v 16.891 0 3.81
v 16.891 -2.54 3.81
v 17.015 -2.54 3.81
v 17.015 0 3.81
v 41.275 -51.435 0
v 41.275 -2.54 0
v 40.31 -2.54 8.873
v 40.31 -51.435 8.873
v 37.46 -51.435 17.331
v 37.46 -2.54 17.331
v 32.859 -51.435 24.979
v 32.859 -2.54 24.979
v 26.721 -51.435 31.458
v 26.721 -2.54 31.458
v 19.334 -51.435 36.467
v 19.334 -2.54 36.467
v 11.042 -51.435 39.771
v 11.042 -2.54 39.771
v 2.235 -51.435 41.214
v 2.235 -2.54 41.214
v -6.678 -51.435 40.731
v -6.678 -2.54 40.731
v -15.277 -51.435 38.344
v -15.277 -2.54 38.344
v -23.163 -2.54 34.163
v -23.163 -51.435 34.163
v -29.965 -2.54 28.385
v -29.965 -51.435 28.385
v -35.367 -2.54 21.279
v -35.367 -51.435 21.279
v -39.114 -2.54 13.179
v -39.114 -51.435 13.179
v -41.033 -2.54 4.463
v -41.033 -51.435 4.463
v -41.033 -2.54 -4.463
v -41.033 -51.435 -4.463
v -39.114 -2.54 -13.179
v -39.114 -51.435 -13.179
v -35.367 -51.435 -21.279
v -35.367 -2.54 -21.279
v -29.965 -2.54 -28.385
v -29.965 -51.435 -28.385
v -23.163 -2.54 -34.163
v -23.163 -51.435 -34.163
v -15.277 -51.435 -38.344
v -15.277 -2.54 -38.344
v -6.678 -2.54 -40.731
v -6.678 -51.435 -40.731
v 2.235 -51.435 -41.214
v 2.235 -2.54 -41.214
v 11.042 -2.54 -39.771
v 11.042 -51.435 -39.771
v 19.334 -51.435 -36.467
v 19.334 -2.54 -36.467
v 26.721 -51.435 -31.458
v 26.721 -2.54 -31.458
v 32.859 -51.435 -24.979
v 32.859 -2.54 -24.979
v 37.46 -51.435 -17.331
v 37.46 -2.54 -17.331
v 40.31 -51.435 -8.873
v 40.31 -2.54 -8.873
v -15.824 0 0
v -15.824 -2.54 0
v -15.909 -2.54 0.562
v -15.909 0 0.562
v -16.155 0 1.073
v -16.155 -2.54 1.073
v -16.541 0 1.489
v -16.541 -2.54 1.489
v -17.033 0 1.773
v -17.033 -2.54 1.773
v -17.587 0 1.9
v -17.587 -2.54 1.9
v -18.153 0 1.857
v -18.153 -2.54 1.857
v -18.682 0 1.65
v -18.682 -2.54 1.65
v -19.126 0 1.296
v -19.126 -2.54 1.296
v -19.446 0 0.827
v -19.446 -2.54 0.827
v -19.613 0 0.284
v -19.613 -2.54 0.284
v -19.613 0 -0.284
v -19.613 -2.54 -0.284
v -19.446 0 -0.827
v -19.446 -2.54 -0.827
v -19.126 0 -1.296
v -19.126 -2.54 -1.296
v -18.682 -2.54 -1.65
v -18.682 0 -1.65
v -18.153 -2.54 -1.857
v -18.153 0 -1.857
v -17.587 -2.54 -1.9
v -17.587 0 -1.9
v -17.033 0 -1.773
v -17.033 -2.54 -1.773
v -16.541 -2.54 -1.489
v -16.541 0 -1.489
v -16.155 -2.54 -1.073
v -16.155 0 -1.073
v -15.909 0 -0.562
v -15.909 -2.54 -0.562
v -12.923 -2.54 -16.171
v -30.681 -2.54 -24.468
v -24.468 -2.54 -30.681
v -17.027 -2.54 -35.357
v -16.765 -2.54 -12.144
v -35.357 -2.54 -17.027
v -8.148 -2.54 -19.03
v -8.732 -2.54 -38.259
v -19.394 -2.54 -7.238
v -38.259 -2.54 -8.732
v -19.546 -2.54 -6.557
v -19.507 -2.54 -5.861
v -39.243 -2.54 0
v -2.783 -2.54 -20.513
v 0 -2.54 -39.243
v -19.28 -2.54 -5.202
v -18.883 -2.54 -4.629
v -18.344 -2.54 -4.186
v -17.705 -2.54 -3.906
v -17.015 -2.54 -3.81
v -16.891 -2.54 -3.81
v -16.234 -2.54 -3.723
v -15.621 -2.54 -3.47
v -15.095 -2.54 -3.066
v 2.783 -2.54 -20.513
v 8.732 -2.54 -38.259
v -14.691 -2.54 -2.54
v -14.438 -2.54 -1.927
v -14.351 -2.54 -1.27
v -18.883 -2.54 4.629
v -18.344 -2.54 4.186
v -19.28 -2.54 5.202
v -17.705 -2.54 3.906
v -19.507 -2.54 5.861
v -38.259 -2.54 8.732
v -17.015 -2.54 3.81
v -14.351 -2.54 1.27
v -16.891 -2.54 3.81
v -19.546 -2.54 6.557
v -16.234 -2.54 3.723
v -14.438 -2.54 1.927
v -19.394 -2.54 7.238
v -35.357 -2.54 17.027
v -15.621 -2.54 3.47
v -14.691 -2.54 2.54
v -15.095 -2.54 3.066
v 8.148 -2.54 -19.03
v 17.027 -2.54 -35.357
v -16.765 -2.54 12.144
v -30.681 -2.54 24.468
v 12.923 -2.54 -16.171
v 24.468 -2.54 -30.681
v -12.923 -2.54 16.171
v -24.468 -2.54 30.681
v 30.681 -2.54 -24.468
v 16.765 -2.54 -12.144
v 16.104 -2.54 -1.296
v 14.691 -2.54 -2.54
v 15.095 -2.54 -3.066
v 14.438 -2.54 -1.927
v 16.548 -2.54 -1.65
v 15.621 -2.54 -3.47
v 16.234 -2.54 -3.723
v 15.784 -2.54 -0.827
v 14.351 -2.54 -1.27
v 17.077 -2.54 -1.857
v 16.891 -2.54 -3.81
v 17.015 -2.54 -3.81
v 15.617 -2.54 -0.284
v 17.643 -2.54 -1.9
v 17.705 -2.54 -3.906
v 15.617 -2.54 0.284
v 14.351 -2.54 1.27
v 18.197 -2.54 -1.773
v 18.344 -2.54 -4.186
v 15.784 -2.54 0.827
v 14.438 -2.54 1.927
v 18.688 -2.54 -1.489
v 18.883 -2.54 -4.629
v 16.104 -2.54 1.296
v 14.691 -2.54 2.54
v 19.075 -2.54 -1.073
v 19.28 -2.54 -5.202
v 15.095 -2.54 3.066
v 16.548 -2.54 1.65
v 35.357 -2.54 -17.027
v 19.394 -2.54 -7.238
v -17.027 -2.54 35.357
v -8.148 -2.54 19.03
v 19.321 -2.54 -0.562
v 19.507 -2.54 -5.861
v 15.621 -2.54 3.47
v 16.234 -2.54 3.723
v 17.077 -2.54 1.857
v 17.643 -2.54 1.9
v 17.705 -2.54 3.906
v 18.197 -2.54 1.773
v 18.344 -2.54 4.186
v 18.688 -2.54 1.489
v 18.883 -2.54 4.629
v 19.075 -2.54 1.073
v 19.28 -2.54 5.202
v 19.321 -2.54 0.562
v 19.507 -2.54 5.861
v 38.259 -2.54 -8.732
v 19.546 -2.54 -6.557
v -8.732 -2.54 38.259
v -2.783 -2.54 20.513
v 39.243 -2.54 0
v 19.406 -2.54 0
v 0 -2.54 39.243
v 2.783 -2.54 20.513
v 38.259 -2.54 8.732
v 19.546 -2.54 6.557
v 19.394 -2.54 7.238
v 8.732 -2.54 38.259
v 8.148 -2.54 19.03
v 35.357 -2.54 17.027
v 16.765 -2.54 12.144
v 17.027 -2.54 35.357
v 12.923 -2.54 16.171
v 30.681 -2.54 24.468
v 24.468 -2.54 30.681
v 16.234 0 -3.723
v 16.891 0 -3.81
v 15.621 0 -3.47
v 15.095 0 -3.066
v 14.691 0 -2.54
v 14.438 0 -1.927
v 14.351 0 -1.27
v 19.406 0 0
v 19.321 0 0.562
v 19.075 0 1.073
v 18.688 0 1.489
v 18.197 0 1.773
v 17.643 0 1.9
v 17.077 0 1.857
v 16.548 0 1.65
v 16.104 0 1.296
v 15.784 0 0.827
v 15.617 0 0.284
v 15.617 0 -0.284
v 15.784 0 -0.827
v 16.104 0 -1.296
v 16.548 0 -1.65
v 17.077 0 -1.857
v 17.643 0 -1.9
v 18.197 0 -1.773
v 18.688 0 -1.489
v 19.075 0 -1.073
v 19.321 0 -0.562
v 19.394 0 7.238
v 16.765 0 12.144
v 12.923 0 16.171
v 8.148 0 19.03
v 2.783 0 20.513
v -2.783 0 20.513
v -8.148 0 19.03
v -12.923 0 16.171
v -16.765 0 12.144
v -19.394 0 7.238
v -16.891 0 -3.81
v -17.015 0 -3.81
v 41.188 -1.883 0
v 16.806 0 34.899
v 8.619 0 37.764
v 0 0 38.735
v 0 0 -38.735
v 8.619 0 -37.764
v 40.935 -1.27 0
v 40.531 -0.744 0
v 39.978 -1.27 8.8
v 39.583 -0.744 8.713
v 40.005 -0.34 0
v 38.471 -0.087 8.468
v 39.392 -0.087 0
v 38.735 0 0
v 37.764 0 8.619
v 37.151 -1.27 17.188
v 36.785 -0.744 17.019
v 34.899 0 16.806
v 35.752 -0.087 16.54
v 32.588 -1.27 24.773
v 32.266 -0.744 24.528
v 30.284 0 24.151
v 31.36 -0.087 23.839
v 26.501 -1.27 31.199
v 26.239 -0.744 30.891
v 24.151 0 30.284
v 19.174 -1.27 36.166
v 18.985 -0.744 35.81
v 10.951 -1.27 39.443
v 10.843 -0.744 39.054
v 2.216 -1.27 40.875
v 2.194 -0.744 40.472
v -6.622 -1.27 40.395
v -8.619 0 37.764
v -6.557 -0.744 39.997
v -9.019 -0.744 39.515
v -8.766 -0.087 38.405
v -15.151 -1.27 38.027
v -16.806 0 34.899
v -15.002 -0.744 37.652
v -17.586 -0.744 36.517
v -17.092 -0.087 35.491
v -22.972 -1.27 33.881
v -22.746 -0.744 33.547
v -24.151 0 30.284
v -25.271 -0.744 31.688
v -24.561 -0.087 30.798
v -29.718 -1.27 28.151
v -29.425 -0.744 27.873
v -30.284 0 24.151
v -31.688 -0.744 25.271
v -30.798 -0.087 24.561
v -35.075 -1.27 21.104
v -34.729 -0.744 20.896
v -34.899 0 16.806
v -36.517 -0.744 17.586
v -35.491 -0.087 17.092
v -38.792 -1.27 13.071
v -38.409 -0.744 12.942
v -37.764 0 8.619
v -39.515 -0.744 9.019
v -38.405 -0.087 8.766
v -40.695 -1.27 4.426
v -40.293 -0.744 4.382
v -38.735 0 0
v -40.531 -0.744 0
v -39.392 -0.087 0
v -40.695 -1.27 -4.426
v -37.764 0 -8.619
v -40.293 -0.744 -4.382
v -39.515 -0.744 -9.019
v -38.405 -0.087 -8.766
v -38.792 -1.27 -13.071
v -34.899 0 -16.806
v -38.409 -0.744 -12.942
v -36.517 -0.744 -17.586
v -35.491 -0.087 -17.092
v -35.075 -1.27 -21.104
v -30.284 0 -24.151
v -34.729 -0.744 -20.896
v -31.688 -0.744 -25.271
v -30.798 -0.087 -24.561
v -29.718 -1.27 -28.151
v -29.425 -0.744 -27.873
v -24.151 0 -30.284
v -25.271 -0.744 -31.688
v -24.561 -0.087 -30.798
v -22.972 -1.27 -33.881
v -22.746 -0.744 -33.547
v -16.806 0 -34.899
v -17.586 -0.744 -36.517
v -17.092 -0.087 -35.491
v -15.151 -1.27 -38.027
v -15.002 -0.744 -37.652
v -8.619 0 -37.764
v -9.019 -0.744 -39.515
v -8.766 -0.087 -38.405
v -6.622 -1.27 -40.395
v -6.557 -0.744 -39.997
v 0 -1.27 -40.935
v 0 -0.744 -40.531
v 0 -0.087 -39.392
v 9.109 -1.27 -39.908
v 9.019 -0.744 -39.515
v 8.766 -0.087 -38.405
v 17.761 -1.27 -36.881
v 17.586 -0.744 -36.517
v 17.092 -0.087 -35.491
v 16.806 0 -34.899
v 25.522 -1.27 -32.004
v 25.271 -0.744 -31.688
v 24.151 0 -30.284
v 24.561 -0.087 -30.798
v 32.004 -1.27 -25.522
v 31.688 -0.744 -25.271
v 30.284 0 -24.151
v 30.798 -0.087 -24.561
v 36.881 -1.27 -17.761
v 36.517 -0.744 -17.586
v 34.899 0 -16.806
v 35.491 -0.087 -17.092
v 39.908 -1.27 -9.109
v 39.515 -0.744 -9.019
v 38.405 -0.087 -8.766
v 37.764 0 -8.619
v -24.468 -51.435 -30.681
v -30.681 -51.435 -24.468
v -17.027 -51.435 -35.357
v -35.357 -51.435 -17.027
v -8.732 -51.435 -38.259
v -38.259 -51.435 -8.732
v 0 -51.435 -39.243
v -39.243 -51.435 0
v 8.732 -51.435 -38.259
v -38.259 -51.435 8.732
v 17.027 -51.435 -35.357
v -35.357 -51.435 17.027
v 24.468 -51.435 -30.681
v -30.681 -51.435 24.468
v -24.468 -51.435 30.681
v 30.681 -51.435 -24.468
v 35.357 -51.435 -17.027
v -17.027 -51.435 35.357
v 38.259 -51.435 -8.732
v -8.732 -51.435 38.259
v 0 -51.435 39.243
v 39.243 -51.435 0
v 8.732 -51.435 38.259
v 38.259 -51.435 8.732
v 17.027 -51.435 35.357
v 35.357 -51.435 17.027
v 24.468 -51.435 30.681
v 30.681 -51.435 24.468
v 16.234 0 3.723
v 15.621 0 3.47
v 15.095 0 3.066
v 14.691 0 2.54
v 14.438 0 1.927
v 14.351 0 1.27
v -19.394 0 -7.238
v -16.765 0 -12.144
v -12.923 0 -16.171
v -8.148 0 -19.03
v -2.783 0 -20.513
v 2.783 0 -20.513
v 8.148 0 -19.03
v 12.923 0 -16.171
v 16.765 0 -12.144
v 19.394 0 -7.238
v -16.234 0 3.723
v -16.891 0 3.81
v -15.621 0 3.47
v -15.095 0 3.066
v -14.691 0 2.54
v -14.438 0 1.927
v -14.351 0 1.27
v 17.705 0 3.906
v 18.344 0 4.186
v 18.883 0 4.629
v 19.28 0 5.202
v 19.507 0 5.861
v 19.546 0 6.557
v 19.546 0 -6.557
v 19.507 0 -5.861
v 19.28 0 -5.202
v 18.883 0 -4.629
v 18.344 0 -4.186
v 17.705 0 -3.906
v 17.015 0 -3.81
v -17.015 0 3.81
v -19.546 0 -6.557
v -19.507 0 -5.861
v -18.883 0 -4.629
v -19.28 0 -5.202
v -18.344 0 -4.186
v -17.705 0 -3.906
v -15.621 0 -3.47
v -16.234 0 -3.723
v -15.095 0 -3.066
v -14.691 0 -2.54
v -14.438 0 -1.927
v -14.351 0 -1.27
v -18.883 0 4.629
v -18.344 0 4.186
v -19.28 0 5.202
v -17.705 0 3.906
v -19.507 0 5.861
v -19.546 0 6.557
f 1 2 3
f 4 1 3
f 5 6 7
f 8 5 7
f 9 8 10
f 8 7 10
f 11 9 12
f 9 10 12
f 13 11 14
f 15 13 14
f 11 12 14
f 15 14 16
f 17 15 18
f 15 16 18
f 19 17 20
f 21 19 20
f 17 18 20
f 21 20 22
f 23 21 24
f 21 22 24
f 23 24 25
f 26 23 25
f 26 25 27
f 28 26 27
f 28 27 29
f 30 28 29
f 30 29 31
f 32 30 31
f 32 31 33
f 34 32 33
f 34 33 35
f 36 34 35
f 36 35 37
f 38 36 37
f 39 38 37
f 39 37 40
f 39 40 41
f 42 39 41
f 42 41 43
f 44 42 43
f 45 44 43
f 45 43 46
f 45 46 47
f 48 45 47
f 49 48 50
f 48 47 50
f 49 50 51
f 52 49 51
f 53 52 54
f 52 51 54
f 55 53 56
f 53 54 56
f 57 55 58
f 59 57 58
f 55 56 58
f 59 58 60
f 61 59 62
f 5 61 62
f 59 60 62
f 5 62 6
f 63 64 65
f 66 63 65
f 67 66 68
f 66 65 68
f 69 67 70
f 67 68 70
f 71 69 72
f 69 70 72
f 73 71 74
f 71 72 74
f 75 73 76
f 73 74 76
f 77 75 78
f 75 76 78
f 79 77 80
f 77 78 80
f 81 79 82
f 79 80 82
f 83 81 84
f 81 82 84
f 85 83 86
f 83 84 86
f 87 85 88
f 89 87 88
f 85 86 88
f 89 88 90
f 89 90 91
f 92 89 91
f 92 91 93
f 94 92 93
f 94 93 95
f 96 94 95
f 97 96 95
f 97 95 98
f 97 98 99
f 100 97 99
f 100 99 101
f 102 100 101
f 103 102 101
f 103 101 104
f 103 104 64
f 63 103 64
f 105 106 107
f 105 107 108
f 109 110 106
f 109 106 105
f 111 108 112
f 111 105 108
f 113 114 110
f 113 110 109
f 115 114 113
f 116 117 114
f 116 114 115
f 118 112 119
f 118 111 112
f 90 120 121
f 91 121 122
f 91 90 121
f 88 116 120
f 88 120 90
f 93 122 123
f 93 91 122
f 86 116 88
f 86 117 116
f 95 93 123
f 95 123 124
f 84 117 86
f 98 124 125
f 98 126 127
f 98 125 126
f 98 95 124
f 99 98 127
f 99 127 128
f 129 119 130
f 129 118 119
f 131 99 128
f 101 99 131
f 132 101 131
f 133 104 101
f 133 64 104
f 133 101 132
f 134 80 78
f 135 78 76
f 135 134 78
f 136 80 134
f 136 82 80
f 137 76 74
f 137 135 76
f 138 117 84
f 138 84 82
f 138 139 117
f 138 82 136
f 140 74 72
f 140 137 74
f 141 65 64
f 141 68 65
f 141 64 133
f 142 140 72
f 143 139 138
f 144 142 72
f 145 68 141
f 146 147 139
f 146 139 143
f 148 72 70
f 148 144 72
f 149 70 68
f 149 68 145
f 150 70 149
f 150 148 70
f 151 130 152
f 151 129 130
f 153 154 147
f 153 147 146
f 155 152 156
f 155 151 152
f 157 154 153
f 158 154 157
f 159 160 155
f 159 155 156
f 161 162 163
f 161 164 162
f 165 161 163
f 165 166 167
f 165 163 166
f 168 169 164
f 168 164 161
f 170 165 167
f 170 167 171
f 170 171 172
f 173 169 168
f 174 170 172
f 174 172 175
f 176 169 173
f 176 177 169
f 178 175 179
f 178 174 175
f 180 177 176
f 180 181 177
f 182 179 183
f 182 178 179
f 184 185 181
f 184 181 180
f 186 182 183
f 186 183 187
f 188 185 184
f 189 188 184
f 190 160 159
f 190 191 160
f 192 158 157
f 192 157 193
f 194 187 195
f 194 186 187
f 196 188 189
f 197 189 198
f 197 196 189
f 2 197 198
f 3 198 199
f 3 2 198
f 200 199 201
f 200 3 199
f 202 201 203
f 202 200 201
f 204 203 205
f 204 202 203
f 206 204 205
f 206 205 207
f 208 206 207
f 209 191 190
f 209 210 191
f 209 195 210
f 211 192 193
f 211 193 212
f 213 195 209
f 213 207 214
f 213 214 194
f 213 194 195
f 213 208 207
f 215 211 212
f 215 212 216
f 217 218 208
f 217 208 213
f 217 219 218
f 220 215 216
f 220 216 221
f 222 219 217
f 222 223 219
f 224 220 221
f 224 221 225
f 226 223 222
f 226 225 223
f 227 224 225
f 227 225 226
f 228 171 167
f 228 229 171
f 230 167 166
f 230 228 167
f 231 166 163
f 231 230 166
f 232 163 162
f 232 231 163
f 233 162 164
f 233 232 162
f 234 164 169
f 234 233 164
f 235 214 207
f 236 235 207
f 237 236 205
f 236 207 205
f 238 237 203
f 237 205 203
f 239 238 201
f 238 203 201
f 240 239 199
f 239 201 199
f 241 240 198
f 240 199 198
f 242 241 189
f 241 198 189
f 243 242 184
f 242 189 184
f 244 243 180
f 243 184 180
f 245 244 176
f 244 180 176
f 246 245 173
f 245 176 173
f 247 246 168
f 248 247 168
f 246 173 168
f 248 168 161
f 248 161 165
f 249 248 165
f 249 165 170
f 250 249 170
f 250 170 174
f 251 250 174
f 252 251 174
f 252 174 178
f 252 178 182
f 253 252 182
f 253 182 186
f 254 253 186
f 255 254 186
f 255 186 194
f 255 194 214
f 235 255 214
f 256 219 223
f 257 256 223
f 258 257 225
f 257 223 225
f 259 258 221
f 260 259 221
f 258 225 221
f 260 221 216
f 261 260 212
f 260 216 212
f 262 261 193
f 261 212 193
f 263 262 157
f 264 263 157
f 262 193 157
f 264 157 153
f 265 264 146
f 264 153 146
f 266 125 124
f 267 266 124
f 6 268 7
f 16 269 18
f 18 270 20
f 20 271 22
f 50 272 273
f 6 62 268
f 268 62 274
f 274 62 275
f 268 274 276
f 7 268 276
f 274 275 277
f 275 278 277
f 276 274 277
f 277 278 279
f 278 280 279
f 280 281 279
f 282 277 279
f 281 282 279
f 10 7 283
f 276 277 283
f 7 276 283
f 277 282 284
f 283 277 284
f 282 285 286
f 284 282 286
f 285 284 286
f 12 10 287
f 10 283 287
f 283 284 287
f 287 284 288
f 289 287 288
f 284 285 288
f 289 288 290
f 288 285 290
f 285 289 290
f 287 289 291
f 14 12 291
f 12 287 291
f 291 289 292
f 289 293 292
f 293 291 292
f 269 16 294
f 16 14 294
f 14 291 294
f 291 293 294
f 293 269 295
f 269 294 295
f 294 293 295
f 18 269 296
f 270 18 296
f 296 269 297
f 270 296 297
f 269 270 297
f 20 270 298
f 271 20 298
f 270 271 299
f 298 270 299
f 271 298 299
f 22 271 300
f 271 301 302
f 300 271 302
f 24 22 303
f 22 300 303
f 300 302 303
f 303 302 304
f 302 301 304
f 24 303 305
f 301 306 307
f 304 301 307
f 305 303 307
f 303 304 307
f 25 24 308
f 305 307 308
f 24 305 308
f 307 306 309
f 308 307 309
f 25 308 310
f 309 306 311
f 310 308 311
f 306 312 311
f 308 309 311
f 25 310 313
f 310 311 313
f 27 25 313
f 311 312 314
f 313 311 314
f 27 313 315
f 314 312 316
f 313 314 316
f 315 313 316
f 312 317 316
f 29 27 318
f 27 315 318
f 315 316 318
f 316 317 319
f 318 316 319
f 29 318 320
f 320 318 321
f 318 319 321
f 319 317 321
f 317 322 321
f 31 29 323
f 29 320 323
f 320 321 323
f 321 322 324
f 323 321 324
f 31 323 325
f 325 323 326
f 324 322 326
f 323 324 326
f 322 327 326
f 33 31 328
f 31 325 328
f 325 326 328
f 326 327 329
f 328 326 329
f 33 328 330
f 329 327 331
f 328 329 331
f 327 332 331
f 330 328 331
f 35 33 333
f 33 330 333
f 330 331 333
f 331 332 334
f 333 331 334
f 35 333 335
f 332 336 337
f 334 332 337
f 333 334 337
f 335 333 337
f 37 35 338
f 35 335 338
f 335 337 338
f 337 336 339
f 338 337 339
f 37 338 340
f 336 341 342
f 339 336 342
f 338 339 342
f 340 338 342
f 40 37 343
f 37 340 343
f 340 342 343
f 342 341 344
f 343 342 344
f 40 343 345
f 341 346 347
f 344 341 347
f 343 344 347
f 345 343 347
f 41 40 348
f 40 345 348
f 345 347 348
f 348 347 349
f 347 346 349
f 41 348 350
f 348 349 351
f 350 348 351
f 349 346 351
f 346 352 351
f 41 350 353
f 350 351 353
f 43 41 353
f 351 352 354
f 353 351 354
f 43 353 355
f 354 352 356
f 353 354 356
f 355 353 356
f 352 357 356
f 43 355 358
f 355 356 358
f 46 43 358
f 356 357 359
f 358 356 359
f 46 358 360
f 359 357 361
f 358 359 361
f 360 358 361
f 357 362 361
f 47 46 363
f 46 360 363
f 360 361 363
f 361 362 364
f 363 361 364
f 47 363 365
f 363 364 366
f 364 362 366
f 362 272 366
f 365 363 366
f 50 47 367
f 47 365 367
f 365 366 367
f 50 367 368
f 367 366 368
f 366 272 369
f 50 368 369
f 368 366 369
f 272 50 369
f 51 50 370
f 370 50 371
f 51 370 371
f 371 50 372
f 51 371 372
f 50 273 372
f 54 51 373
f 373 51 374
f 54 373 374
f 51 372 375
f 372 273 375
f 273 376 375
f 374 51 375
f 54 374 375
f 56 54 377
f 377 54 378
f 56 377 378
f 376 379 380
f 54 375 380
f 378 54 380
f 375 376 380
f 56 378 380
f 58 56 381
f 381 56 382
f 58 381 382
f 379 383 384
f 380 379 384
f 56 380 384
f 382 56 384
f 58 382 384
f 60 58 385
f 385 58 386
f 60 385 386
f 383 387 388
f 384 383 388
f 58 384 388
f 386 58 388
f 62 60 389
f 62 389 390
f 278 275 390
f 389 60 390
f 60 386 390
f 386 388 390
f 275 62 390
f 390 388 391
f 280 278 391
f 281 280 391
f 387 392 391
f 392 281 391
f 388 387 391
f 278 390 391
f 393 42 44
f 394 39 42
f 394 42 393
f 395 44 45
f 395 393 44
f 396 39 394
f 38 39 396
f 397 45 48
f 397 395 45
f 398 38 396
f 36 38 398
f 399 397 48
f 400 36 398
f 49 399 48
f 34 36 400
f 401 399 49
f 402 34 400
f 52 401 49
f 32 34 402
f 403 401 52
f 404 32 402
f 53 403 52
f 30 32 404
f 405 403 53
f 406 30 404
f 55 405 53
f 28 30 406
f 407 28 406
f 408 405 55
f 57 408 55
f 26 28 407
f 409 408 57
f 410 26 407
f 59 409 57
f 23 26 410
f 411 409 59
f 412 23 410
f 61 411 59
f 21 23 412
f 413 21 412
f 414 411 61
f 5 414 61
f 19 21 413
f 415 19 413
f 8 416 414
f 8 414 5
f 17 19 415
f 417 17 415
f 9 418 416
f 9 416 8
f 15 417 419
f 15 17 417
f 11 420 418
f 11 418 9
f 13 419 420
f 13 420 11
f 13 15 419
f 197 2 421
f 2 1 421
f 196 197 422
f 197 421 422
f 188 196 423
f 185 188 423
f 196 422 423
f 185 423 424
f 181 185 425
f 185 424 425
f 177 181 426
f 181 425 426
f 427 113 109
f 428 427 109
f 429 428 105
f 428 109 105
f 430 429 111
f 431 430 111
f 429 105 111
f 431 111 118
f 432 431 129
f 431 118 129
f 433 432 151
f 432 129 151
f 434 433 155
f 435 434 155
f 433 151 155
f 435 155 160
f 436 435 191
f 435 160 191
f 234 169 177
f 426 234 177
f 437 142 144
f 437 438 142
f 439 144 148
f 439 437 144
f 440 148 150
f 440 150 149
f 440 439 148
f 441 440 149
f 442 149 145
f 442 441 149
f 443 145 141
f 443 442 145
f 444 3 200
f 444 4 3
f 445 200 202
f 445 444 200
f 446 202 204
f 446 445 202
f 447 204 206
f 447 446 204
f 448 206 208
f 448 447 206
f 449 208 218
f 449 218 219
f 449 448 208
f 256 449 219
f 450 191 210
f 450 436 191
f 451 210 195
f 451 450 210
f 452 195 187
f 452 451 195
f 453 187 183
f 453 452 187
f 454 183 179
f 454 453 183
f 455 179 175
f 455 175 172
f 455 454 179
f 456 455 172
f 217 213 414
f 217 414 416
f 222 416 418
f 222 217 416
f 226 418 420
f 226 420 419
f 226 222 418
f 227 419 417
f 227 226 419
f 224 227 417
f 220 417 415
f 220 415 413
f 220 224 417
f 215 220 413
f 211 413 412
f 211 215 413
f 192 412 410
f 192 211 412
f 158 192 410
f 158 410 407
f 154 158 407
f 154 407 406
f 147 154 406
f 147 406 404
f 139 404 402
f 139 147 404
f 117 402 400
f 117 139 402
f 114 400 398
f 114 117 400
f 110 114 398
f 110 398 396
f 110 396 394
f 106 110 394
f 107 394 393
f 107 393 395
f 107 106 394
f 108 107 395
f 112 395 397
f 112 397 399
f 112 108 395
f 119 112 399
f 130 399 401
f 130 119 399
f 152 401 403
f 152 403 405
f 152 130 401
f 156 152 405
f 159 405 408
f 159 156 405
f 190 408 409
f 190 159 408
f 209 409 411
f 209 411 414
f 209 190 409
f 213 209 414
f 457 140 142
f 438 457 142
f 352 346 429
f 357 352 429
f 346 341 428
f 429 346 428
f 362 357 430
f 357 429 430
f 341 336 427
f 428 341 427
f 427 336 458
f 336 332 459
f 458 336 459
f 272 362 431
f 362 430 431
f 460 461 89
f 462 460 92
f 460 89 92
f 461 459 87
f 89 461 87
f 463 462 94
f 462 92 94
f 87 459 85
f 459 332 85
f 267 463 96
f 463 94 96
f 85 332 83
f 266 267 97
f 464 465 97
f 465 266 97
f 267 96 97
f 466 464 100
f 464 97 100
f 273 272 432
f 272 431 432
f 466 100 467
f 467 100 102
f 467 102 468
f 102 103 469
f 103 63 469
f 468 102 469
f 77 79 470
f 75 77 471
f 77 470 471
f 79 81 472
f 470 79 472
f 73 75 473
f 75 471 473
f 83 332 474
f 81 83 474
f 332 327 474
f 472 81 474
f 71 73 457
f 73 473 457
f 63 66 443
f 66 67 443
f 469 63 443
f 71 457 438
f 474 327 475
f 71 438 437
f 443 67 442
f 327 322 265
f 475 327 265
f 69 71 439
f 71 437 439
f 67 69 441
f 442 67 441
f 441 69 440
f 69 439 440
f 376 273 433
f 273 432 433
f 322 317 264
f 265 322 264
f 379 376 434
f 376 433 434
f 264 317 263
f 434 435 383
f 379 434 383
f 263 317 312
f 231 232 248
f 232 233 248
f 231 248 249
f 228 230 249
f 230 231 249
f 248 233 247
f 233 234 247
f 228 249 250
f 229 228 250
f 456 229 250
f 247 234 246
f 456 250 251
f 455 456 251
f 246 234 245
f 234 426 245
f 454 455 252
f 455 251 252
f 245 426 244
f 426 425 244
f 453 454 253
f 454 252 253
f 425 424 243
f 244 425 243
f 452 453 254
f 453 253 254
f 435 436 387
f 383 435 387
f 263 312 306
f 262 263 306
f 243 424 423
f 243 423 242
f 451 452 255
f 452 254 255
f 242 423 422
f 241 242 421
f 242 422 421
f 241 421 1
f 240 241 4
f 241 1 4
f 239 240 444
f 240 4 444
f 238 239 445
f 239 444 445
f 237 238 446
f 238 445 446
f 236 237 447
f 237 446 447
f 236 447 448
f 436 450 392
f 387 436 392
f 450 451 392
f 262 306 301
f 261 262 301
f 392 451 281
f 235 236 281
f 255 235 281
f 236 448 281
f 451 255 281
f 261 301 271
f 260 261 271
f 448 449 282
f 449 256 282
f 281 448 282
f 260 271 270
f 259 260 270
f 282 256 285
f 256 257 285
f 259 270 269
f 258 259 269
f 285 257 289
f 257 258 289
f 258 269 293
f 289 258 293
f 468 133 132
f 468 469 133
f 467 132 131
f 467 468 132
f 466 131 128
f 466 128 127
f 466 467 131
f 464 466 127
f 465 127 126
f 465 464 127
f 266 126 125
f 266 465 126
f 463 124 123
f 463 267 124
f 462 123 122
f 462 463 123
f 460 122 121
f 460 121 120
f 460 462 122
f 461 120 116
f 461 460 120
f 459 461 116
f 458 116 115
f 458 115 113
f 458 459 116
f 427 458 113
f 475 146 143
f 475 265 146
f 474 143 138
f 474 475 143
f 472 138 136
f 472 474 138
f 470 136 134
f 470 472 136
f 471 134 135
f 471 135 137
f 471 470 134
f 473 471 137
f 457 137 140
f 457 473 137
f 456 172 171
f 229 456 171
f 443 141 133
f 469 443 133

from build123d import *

# Parameters (mm, degrees)
F0_R          = 41.275
F1_DEPTH      = 2.54
F3_R          = 41.275
F3_R_2        = 39.243
F4_DEPTH      = 48.895
F5_R          = 2.54
F2_R          = 1.905
F6_DEPTH      = 25.4
F6_DEPTH_BACK = 25.4
F7_R          = 2.54


with BuildPart() as f1:
    # F0 (on Front) → F1 (new body)
    with BuildSketch(Plane.XZ):
        Circle(F0_R)
    extrude(amount=F1_DEPTH)

    # F3 (on face) → F4 (join)
    with BuildSketch(Plane.XZ.offset(2.54)):
        Circle(F3_R)
        Circle(F3_R_2, mode=Mode.SUBTRACT)
    extrude(amount=F4_DEPTH)

    # F5
    f5_edges = [f1.edges().sort_by_distance(p)[0] for p in [
        (-41.275, 0, 0),
    ]]
    fillet(f5_edges, radius=F5_R)

    # F2 (on face) → F6 (cut, two sides)
    with BuildSketch(Plane.XZ.offset(2.54)) as f6_sk:
        with Locations((17.5006, 0)):
            Circle(F2_R)
        with Locations((-17.7292, 0)):
            Circle(F2_R)
        with BuildLine():
            Line((14.351, 3.81), (20.3473659475, 3.81))
            ThreePointArc((20.3473659475, 3.81), (0, 20.701), (-20.3473659475, 3.81))
            Line((-20.3473659475, 3.81), (-14.351, 3.81))
            Line((-14.351, 3.81), (-14.351, -3.81))
            Line((-14.351, -3.81), (-20.3473659475, -3.81))
            ThreePointArc((-20.3473659475, -3.81), (0, -20.701), (20.3473659475, -3.81))
            Line((20.3473659475, -3.81), (14.351, -3.81))
            Line((14.351, -3.81), (14.351, 3.81))
        make_face()
    extrude(amount=-F6_DEPTH, mode=Mode.SUBTRACT)
    extrude(f6_sk.sketch, amount=F6_DEPTH_BACK, mode=Mode.SUBTRACT)

    # F7
    f7_edges = [f1.edges().sort_by_distance(p)[0] for p in [
        (-20.347366, -1.27, 3.81),
        (-14.351, -1.27, 3.81),
        (-14.351, -1.27, -3.81),
        (-20.347366, -1.27, -3.81),
        (14.351, -1.27, 3.81),
        (14.351, -1.27, -3.81),
        (20.347366, -1.27, -3.81),
        (20.347366, -1.27, 3.81),
    ]]
    fillet(f7_edges, radius=F7_R)


solid = f1.part
